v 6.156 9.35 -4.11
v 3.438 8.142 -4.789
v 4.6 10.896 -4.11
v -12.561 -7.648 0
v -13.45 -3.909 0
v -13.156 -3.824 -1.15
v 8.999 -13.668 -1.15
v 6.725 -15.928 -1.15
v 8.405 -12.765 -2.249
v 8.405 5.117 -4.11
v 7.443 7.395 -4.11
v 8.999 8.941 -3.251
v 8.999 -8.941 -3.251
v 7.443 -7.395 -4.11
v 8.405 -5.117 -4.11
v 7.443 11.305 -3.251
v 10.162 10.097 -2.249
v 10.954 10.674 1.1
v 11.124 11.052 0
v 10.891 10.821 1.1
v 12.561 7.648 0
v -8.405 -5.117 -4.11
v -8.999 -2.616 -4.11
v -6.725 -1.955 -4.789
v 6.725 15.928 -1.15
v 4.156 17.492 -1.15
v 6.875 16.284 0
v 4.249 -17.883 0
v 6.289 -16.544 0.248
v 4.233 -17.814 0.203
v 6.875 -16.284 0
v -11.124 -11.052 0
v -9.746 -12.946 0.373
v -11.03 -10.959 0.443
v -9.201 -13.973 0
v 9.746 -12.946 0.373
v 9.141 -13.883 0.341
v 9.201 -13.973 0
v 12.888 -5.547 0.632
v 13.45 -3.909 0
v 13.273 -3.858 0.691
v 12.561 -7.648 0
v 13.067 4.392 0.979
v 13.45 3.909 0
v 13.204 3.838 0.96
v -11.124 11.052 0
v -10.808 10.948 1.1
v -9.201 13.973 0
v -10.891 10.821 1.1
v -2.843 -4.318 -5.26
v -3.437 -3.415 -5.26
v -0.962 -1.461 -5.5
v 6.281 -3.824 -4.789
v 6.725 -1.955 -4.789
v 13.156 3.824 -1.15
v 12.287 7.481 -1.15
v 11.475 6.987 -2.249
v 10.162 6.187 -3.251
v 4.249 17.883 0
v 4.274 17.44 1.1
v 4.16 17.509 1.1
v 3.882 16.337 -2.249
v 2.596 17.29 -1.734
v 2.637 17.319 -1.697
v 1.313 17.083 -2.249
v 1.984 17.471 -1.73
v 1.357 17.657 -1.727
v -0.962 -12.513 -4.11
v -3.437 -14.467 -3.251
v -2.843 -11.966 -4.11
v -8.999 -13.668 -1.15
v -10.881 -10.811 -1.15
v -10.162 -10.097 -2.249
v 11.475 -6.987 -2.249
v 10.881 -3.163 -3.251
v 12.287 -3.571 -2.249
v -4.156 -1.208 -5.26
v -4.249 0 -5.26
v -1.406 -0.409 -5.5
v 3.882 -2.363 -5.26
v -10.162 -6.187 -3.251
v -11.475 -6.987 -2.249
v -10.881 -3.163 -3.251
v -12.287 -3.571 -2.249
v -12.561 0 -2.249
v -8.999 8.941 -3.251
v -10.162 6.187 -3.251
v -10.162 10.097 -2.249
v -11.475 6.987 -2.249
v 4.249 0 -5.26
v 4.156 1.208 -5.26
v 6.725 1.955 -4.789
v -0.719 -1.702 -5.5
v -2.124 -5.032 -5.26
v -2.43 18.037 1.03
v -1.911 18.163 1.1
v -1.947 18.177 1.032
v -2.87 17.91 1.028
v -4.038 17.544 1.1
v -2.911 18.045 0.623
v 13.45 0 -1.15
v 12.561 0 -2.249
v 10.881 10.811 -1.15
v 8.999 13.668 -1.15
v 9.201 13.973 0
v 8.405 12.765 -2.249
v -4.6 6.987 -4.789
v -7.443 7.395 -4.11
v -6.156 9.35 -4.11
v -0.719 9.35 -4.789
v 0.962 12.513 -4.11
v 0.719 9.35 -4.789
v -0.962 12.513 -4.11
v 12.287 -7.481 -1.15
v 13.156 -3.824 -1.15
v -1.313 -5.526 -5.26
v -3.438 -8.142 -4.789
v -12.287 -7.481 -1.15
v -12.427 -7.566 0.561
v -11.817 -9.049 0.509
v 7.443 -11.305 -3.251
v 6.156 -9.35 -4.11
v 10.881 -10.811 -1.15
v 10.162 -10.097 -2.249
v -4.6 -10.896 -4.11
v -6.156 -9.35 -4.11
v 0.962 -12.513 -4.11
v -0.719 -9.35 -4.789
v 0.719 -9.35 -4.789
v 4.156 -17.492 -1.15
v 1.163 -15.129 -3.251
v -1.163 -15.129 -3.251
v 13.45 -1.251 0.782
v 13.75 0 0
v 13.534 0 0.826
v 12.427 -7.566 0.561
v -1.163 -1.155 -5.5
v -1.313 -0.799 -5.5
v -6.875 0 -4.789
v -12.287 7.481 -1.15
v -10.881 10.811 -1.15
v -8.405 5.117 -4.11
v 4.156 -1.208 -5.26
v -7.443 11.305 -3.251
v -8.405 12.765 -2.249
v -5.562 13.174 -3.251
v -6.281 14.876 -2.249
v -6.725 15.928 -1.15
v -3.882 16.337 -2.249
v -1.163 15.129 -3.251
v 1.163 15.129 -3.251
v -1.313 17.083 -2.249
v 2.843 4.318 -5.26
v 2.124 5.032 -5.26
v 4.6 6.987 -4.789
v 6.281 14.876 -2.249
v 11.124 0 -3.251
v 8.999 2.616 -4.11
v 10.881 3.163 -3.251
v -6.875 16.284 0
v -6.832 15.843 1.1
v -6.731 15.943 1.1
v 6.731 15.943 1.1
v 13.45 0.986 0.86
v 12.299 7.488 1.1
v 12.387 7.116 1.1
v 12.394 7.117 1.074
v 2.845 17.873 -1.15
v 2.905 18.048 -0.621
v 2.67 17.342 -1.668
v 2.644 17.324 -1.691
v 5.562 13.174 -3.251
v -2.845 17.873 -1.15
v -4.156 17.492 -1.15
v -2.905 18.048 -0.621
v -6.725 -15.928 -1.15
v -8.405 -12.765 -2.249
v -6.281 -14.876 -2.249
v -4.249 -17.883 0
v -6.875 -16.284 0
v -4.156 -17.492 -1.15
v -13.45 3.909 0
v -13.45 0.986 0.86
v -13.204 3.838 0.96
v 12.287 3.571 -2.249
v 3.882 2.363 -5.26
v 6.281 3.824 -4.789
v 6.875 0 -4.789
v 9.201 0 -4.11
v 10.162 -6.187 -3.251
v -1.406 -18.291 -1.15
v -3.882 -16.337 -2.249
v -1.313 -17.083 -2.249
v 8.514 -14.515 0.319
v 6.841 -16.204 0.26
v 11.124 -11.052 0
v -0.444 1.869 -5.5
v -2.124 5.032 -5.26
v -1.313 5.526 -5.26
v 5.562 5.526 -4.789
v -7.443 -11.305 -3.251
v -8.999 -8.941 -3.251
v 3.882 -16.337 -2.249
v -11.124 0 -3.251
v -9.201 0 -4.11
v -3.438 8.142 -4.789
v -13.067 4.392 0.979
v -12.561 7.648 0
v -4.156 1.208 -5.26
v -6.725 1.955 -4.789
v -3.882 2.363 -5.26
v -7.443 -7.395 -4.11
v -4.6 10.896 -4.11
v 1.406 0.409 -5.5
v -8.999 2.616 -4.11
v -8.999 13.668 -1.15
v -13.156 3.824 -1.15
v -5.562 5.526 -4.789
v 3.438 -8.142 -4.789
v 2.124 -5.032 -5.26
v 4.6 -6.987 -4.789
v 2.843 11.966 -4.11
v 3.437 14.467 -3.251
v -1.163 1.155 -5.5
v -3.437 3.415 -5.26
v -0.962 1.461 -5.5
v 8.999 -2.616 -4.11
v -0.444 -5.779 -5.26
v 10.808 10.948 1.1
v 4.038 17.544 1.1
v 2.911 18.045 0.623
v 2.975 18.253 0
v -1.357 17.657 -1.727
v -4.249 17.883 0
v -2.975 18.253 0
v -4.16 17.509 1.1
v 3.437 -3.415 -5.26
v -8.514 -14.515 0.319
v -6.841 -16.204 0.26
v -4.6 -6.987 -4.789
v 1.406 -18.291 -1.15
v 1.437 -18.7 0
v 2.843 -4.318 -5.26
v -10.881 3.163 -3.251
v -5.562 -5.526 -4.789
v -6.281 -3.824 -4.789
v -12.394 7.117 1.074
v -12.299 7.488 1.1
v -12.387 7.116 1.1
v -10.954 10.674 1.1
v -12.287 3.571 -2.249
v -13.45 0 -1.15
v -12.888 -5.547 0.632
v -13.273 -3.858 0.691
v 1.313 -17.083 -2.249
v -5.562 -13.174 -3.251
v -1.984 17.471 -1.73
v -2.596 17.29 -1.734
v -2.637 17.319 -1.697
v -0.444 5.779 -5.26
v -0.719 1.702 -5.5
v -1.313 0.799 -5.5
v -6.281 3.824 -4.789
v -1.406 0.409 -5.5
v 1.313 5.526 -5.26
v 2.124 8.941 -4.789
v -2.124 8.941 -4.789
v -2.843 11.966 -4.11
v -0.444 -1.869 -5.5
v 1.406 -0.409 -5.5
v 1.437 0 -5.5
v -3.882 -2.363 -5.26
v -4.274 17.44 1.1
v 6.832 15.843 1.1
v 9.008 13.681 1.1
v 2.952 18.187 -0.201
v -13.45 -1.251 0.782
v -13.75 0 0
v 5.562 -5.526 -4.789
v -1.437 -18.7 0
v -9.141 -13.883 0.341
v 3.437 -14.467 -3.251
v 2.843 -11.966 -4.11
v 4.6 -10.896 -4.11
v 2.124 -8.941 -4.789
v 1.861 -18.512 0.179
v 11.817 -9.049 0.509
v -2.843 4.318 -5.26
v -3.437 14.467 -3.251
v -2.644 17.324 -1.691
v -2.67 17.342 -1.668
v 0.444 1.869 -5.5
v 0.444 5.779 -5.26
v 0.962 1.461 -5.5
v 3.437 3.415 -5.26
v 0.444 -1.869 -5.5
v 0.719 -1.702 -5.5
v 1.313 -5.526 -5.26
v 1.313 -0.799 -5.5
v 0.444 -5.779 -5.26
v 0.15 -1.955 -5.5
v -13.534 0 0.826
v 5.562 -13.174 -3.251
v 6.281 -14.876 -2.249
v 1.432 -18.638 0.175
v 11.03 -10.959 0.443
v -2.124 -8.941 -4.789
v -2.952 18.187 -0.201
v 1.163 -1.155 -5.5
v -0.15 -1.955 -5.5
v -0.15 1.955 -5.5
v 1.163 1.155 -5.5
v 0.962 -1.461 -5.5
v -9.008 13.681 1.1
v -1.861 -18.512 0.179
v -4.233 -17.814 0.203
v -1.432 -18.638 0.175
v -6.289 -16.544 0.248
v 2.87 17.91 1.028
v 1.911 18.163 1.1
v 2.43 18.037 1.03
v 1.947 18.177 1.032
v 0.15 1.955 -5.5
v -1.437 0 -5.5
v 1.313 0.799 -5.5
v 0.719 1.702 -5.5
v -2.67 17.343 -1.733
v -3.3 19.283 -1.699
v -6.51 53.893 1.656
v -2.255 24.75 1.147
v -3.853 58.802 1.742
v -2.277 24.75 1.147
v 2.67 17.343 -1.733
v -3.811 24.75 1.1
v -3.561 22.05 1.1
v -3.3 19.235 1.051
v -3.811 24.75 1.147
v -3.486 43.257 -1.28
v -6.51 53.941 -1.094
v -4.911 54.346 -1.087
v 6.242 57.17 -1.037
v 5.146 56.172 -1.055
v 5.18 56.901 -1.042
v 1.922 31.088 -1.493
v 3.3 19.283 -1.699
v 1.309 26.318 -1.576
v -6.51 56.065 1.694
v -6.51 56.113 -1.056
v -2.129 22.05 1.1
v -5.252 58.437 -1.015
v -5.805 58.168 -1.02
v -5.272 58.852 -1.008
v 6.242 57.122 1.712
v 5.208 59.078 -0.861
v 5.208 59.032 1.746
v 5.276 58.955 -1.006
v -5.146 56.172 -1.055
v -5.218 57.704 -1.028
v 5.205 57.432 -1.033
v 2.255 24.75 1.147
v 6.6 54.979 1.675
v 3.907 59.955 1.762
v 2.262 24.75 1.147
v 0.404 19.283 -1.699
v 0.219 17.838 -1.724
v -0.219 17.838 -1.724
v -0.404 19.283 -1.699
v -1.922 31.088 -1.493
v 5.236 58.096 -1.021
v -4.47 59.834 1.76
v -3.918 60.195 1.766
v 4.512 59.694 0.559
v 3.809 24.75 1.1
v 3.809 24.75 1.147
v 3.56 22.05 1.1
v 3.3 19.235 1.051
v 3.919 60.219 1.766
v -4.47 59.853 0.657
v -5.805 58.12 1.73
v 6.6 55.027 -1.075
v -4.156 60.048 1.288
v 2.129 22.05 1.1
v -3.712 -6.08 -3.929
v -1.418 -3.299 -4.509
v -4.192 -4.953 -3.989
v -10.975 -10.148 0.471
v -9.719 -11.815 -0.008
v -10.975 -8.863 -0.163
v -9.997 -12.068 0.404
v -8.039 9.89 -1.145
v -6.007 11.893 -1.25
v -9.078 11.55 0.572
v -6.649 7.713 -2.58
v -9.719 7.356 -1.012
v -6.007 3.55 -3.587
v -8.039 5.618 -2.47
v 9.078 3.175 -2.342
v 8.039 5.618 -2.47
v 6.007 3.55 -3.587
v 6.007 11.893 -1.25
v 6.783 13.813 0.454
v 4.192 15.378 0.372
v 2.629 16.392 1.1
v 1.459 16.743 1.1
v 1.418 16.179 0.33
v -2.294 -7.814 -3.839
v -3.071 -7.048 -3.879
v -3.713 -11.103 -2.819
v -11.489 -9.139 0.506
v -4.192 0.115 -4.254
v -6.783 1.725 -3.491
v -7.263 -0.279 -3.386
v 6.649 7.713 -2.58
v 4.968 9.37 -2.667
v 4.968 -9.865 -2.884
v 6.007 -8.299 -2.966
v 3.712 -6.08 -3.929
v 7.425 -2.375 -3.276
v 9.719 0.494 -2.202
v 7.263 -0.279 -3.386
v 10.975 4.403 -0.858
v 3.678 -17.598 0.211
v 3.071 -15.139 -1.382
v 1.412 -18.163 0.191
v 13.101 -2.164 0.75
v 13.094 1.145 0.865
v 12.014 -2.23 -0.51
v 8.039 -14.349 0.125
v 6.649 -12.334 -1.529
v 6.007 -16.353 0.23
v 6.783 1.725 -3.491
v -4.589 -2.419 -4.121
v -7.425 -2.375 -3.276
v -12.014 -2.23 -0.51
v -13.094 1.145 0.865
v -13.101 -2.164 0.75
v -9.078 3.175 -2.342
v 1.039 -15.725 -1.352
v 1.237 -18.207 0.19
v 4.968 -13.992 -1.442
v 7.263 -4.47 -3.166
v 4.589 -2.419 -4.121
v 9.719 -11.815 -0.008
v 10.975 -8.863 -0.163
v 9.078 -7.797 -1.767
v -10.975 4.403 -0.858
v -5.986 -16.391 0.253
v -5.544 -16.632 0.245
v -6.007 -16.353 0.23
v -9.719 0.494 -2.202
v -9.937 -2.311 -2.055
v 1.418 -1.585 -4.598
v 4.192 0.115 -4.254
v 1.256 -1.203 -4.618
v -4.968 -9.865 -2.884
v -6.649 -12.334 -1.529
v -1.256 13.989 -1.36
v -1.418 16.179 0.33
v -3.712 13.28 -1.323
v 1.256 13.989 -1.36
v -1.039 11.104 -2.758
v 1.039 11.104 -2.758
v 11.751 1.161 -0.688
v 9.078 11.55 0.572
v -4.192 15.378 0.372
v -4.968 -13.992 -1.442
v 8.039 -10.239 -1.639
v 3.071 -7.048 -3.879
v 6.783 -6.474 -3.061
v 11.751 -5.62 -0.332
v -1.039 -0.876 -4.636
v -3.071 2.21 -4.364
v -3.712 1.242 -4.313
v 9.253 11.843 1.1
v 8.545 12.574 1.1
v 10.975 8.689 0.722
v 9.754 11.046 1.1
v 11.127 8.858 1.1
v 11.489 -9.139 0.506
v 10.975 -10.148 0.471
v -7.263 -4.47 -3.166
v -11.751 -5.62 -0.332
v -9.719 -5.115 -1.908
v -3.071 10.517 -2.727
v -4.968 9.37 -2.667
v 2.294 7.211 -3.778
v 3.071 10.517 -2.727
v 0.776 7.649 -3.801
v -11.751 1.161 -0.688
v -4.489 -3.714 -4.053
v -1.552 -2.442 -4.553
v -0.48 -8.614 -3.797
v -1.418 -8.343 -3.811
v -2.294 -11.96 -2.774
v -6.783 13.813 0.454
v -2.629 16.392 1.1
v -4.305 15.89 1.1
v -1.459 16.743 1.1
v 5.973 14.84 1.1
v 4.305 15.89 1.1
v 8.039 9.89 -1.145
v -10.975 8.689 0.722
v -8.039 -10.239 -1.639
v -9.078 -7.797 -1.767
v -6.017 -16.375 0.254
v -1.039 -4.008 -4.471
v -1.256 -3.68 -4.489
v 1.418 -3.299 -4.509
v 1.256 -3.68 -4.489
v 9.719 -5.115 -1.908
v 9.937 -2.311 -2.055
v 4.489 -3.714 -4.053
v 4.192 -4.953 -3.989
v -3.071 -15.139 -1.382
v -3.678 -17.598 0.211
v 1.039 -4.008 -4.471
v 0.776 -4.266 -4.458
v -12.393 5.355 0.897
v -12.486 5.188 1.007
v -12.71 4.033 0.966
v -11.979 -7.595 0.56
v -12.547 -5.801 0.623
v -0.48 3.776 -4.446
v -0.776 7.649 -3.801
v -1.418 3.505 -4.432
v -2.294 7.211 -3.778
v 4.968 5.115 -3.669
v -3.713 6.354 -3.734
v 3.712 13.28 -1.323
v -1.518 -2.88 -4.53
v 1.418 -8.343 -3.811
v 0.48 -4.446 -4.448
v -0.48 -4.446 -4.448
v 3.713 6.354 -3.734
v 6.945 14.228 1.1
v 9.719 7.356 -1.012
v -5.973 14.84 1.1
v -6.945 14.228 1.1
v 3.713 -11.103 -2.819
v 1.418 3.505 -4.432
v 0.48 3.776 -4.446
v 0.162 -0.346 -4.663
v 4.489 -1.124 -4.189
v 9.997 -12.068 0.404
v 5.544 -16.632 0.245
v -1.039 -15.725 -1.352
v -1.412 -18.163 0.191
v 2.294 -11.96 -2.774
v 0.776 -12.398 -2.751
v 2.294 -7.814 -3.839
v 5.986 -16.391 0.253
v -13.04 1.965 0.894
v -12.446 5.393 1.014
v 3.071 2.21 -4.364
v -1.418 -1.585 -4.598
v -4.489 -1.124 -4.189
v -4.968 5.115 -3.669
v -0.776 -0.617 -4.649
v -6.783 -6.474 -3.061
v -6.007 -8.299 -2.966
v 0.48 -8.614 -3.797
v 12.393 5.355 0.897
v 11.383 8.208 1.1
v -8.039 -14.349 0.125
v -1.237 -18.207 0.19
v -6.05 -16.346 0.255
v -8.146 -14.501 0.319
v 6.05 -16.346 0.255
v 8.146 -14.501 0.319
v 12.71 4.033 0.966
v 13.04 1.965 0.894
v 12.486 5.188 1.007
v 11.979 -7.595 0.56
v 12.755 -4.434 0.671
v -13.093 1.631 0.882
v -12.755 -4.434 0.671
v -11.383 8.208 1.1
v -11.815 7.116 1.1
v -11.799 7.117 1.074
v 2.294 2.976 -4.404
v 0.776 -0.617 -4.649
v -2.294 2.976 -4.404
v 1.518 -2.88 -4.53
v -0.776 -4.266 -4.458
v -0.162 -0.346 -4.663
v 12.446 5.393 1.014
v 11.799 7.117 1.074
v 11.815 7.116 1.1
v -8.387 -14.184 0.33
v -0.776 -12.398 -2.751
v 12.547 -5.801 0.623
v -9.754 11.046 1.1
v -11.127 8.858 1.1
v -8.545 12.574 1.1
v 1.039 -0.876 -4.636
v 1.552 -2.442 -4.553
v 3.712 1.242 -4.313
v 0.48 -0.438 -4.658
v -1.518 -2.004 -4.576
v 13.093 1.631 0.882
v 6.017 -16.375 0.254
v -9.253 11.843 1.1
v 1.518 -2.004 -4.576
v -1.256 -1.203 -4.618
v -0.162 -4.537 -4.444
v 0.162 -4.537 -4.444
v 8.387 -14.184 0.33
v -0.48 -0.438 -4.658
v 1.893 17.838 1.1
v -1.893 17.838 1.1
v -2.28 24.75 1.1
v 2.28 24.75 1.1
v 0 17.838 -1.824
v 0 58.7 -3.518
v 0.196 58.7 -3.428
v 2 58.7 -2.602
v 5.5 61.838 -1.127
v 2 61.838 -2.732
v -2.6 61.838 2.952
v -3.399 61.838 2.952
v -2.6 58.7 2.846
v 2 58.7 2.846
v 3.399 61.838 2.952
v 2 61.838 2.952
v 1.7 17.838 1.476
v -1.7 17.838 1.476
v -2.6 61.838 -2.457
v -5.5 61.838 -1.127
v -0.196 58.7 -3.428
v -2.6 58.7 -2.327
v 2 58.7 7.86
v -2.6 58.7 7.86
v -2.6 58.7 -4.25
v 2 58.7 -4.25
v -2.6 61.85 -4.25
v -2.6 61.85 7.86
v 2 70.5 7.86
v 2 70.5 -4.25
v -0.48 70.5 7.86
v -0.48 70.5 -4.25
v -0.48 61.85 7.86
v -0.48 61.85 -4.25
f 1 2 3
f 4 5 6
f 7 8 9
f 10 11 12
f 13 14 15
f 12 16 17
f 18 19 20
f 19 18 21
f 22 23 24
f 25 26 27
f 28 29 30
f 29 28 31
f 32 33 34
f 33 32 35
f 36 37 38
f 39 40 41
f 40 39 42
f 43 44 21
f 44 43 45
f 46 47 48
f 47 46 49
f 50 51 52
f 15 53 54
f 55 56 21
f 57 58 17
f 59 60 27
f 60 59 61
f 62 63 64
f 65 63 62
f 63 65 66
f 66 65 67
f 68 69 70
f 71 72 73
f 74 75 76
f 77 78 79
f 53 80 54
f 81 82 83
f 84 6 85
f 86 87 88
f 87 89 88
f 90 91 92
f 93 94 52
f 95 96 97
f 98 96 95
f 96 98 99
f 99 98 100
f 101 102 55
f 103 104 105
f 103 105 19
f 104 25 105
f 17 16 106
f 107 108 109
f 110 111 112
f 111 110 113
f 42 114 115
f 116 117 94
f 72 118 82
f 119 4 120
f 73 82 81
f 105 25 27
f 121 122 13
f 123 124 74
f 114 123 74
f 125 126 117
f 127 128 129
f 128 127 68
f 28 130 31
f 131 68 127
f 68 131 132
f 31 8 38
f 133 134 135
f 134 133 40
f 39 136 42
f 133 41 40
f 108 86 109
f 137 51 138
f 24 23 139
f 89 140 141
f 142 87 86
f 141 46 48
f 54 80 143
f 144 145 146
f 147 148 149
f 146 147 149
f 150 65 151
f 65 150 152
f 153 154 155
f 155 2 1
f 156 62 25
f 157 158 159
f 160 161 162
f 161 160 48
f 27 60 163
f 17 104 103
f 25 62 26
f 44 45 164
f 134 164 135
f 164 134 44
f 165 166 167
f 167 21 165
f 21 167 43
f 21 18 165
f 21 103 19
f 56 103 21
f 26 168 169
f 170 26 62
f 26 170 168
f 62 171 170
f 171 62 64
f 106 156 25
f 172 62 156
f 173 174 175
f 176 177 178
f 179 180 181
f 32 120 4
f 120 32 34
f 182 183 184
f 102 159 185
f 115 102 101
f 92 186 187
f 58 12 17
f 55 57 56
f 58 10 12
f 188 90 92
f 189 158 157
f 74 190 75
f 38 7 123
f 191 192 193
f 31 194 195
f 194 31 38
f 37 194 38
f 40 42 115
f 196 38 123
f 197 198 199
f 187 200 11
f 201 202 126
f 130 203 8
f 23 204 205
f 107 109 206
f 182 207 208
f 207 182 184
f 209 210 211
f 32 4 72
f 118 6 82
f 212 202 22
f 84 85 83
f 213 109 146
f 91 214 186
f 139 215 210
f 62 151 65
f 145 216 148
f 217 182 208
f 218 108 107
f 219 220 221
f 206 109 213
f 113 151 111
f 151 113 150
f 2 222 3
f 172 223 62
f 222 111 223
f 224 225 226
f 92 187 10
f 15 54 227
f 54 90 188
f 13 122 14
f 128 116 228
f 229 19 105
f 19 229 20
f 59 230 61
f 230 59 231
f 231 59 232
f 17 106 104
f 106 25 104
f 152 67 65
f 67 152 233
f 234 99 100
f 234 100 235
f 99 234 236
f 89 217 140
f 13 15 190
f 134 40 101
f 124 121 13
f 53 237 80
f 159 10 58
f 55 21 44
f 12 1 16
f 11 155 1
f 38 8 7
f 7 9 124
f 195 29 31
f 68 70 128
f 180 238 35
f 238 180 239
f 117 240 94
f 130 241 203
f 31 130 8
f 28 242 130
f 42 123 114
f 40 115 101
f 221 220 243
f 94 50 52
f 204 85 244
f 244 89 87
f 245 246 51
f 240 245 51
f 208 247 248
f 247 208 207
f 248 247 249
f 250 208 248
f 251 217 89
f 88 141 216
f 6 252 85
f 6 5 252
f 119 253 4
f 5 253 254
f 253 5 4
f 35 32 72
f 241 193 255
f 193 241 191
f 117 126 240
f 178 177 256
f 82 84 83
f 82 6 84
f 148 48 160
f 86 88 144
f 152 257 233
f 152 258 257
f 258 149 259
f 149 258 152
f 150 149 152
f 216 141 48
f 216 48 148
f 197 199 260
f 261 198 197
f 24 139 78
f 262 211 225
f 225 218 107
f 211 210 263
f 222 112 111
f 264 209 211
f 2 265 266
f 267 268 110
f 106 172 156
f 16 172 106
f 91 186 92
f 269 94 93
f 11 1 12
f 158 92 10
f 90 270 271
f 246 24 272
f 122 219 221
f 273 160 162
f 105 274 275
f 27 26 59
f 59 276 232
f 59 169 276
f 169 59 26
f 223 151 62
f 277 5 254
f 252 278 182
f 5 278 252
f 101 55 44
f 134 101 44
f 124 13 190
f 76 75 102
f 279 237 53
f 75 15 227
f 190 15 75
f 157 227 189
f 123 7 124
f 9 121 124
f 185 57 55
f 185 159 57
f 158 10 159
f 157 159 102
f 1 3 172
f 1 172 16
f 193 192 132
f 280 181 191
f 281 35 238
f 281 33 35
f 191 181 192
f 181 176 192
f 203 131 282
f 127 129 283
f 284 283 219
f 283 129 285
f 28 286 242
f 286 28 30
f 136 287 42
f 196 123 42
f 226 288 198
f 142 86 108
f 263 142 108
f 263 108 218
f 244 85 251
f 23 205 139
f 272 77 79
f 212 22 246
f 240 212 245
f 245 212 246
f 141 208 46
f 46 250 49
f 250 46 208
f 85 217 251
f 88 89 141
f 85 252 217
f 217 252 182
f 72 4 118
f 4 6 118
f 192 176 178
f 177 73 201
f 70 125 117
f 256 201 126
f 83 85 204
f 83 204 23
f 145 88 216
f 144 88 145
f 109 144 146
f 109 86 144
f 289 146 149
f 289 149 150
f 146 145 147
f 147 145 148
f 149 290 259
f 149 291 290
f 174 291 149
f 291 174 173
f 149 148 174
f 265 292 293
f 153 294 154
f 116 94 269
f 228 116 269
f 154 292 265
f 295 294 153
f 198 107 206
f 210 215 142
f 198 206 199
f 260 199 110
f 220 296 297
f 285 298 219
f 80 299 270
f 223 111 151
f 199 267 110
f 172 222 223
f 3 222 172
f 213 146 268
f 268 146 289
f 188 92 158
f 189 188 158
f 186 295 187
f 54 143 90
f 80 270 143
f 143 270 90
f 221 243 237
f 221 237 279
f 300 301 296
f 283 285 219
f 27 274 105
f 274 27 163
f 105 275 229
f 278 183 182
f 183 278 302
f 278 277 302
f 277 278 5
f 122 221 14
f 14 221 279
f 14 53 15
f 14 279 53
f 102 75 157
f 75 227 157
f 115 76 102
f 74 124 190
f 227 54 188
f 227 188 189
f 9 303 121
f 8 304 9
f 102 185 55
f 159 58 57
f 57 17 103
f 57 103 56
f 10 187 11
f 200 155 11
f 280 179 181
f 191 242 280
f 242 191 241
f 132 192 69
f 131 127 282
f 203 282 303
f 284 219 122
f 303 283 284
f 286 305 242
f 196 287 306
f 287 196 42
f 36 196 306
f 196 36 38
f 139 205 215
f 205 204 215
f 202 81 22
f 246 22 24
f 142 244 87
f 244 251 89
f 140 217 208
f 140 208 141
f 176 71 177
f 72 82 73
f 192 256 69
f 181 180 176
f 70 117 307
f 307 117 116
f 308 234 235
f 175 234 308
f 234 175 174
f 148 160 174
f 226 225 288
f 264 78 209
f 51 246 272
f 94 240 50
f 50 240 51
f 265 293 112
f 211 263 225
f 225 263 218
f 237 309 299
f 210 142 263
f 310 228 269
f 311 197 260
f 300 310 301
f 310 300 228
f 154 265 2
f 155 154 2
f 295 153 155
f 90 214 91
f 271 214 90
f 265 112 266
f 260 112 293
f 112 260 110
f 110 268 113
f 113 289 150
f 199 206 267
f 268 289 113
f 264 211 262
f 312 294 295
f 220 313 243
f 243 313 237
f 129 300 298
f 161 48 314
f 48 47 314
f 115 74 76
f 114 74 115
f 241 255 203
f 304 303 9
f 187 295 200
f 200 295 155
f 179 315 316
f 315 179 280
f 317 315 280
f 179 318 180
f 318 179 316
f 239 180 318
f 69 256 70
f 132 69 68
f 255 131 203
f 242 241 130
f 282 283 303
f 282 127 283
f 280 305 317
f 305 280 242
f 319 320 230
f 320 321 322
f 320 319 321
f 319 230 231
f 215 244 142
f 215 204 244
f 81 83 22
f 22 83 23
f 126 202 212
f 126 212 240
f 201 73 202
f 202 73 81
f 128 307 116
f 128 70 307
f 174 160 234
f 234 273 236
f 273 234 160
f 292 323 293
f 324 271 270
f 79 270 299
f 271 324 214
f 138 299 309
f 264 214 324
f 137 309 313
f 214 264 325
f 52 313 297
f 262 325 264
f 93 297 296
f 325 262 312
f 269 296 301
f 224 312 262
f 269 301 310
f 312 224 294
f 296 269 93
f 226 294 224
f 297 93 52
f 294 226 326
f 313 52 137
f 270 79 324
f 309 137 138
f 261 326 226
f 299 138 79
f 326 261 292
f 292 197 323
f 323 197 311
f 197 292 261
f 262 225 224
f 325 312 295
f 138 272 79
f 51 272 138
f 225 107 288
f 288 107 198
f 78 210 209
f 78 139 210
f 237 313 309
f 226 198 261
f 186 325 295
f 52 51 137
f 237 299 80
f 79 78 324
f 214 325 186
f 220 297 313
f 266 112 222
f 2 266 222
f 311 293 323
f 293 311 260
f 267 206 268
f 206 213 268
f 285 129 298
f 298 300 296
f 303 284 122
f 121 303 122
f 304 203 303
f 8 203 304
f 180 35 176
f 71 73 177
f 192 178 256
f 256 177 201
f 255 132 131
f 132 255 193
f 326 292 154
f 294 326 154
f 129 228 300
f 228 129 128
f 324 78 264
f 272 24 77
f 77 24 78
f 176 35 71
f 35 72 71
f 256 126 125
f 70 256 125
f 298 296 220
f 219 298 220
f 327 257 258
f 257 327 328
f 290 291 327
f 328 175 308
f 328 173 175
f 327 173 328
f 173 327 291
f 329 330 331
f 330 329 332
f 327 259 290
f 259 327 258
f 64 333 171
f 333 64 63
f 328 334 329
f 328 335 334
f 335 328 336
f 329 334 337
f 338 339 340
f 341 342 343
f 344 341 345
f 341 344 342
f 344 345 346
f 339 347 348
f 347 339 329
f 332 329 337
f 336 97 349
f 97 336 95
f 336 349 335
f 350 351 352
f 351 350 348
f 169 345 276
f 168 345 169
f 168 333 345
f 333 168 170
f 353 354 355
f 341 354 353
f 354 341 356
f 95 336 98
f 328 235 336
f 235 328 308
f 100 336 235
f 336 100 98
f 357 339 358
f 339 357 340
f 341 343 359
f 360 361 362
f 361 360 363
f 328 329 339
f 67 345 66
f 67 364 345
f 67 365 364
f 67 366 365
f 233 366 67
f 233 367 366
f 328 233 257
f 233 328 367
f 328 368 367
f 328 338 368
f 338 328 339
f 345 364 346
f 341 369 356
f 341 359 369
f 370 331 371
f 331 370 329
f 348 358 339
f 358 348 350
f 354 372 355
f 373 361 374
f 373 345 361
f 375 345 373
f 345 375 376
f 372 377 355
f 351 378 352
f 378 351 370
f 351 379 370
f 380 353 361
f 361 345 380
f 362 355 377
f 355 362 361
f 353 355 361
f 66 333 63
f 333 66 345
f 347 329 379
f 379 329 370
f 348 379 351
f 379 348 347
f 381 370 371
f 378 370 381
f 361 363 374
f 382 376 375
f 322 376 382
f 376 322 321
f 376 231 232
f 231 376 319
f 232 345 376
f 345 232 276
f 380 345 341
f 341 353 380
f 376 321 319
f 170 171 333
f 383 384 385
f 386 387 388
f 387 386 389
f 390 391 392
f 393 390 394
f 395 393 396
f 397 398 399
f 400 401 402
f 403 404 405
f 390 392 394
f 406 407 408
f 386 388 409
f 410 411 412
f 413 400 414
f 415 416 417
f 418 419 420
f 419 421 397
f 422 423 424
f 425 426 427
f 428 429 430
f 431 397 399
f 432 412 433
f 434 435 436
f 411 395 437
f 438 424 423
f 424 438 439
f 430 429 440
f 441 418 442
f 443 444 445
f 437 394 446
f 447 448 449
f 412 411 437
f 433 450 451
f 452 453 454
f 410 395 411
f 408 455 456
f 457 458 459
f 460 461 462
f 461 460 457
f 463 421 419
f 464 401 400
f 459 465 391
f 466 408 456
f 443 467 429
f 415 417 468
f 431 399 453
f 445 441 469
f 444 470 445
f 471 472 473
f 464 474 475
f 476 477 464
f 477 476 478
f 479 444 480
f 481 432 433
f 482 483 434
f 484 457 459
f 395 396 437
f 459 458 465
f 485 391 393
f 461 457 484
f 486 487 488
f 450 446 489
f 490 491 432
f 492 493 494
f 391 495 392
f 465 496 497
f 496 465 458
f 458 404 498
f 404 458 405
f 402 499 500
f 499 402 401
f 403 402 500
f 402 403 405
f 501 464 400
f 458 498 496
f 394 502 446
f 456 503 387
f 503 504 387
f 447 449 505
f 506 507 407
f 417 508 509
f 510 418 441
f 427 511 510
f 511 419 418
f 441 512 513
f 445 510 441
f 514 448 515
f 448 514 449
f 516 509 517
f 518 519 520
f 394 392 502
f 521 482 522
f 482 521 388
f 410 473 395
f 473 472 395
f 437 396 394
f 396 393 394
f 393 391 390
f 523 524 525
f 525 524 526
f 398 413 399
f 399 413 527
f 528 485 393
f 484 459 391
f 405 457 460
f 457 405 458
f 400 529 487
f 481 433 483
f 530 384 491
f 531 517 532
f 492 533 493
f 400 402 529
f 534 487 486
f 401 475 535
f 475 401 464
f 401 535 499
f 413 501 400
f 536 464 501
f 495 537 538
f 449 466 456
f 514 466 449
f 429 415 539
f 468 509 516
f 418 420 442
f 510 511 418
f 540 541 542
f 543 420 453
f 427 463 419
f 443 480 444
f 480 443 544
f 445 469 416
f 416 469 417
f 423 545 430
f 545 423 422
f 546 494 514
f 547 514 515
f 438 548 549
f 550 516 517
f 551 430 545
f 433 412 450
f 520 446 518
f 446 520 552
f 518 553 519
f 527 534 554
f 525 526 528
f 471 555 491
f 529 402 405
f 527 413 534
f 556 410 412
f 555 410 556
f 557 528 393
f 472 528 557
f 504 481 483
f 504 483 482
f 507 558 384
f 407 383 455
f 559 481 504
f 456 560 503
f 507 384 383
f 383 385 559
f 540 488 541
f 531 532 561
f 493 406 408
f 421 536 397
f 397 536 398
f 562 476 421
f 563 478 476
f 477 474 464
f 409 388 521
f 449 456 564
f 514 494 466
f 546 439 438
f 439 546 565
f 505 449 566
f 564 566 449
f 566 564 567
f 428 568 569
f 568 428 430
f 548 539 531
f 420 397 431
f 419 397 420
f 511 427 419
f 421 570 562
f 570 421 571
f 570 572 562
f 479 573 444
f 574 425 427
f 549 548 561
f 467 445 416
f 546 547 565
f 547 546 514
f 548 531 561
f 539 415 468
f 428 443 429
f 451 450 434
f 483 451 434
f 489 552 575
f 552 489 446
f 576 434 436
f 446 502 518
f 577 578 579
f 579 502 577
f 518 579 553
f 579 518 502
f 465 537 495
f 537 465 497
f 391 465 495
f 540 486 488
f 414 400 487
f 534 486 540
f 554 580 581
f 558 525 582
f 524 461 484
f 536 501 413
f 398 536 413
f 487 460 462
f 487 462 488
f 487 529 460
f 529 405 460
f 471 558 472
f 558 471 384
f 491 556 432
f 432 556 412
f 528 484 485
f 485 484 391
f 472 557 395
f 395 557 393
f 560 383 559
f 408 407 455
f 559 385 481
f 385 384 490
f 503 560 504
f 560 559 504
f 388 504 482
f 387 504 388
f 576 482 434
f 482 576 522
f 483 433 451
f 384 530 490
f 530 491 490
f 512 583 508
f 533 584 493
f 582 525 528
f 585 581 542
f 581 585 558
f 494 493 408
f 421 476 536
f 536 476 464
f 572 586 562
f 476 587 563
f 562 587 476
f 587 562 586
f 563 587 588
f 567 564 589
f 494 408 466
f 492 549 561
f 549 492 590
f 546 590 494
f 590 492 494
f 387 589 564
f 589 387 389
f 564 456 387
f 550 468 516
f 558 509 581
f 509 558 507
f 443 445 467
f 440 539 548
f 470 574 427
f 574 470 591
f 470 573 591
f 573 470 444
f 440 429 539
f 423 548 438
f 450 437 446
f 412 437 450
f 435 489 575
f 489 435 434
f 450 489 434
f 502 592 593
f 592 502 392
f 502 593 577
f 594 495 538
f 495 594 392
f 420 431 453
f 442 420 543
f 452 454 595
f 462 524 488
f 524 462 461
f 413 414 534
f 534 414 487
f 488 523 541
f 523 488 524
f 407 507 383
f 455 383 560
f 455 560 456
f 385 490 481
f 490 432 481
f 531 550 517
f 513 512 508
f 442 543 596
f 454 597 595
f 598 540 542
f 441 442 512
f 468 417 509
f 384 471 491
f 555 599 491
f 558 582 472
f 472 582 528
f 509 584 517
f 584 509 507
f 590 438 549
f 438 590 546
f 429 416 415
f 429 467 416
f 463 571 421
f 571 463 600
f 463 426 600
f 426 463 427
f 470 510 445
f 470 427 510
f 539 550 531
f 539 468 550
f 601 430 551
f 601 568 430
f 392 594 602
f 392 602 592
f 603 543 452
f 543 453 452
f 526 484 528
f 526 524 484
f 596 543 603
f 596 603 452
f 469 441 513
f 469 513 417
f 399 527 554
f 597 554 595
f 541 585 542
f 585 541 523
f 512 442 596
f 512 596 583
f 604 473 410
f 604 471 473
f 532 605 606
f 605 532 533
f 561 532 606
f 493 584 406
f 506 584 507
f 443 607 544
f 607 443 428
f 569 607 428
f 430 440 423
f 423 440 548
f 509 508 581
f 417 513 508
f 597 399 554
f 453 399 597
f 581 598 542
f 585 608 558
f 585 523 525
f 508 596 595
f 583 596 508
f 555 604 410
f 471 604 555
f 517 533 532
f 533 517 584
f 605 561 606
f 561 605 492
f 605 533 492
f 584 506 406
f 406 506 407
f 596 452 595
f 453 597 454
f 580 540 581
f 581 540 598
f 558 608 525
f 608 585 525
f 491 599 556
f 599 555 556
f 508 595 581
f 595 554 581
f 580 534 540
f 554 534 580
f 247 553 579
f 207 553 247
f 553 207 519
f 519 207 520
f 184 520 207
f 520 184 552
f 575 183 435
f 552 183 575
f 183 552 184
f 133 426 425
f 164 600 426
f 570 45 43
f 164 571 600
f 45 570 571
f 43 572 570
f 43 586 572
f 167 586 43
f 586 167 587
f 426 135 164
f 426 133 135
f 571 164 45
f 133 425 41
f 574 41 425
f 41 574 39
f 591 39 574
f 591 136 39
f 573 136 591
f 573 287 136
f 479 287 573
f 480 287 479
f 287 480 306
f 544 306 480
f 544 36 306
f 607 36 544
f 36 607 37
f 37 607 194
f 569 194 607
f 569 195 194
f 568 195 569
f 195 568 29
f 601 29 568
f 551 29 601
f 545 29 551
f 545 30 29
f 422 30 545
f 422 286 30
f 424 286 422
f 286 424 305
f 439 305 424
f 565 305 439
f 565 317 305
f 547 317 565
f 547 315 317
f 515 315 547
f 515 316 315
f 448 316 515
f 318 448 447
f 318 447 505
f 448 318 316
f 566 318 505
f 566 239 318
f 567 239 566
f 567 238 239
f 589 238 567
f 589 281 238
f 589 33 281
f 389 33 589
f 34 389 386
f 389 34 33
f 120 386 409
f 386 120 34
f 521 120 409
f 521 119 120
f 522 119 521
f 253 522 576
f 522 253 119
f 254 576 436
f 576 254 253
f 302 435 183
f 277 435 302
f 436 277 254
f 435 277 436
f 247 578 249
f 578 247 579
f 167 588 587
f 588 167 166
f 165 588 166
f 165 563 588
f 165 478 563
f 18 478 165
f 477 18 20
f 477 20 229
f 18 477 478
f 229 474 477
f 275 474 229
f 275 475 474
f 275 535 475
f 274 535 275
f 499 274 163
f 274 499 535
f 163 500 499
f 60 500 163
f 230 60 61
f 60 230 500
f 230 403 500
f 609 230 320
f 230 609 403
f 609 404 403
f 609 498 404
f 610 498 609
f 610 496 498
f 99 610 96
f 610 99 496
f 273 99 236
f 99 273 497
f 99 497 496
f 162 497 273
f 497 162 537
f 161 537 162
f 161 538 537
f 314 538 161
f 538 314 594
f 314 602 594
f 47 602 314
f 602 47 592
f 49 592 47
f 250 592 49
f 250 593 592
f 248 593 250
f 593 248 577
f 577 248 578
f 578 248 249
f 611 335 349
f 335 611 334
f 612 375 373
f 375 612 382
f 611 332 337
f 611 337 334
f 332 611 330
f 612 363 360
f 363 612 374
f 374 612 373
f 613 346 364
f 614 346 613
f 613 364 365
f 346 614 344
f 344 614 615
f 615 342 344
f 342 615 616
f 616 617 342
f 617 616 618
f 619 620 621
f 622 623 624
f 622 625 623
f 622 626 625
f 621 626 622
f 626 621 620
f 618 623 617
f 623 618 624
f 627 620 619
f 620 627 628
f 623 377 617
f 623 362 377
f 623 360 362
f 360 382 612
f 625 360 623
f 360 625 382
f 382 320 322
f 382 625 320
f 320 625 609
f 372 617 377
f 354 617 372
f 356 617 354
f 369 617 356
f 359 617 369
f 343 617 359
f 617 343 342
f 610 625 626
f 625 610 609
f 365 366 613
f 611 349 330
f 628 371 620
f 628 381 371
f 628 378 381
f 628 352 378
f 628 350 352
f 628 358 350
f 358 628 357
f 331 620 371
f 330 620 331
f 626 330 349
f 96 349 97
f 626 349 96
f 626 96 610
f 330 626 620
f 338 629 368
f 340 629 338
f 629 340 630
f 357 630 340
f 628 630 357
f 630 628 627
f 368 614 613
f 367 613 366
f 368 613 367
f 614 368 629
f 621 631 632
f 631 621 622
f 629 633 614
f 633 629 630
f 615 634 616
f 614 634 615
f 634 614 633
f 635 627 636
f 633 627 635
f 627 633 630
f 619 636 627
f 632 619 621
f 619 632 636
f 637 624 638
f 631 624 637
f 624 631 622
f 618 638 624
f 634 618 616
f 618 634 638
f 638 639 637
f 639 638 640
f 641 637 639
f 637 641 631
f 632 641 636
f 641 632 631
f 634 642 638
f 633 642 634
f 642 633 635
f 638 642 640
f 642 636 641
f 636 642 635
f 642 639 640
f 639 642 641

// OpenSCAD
module spoon(){difference(){positive();rotate([357,0,0])translate([0,-2,4.75])resize(newsize=[27,36.5,18])sphere(25);rotate([2,0,0])translate([0,-16,2.75])cube([35,45,4],center=true);translate([0,0,3])cube([35,45,4],center=true);}


resize(newsize=[10,40,6])translate([0,52,0])rotate([0,90,270])cylinder(37,4,2,$fn=5);}

scale(1.1)spoon();

module positive(){
resize(newsize=[25,34,10])sphere(25);
rotate([1,0,0])
translate([0,0,-1.85])linear_extrude(height=2.5)hull(){translate([0,17.5,0])circle(3); translate([0,50,0])circle(6);}}

translate([2,70.5,-4.25])rotate([90,0,270])usb();


module usb(){

difference(){

cube ([11.8,12.11,4.6]);

translate([0,0,2.48])
cube([8.65,12.11,2.12]);

}}
